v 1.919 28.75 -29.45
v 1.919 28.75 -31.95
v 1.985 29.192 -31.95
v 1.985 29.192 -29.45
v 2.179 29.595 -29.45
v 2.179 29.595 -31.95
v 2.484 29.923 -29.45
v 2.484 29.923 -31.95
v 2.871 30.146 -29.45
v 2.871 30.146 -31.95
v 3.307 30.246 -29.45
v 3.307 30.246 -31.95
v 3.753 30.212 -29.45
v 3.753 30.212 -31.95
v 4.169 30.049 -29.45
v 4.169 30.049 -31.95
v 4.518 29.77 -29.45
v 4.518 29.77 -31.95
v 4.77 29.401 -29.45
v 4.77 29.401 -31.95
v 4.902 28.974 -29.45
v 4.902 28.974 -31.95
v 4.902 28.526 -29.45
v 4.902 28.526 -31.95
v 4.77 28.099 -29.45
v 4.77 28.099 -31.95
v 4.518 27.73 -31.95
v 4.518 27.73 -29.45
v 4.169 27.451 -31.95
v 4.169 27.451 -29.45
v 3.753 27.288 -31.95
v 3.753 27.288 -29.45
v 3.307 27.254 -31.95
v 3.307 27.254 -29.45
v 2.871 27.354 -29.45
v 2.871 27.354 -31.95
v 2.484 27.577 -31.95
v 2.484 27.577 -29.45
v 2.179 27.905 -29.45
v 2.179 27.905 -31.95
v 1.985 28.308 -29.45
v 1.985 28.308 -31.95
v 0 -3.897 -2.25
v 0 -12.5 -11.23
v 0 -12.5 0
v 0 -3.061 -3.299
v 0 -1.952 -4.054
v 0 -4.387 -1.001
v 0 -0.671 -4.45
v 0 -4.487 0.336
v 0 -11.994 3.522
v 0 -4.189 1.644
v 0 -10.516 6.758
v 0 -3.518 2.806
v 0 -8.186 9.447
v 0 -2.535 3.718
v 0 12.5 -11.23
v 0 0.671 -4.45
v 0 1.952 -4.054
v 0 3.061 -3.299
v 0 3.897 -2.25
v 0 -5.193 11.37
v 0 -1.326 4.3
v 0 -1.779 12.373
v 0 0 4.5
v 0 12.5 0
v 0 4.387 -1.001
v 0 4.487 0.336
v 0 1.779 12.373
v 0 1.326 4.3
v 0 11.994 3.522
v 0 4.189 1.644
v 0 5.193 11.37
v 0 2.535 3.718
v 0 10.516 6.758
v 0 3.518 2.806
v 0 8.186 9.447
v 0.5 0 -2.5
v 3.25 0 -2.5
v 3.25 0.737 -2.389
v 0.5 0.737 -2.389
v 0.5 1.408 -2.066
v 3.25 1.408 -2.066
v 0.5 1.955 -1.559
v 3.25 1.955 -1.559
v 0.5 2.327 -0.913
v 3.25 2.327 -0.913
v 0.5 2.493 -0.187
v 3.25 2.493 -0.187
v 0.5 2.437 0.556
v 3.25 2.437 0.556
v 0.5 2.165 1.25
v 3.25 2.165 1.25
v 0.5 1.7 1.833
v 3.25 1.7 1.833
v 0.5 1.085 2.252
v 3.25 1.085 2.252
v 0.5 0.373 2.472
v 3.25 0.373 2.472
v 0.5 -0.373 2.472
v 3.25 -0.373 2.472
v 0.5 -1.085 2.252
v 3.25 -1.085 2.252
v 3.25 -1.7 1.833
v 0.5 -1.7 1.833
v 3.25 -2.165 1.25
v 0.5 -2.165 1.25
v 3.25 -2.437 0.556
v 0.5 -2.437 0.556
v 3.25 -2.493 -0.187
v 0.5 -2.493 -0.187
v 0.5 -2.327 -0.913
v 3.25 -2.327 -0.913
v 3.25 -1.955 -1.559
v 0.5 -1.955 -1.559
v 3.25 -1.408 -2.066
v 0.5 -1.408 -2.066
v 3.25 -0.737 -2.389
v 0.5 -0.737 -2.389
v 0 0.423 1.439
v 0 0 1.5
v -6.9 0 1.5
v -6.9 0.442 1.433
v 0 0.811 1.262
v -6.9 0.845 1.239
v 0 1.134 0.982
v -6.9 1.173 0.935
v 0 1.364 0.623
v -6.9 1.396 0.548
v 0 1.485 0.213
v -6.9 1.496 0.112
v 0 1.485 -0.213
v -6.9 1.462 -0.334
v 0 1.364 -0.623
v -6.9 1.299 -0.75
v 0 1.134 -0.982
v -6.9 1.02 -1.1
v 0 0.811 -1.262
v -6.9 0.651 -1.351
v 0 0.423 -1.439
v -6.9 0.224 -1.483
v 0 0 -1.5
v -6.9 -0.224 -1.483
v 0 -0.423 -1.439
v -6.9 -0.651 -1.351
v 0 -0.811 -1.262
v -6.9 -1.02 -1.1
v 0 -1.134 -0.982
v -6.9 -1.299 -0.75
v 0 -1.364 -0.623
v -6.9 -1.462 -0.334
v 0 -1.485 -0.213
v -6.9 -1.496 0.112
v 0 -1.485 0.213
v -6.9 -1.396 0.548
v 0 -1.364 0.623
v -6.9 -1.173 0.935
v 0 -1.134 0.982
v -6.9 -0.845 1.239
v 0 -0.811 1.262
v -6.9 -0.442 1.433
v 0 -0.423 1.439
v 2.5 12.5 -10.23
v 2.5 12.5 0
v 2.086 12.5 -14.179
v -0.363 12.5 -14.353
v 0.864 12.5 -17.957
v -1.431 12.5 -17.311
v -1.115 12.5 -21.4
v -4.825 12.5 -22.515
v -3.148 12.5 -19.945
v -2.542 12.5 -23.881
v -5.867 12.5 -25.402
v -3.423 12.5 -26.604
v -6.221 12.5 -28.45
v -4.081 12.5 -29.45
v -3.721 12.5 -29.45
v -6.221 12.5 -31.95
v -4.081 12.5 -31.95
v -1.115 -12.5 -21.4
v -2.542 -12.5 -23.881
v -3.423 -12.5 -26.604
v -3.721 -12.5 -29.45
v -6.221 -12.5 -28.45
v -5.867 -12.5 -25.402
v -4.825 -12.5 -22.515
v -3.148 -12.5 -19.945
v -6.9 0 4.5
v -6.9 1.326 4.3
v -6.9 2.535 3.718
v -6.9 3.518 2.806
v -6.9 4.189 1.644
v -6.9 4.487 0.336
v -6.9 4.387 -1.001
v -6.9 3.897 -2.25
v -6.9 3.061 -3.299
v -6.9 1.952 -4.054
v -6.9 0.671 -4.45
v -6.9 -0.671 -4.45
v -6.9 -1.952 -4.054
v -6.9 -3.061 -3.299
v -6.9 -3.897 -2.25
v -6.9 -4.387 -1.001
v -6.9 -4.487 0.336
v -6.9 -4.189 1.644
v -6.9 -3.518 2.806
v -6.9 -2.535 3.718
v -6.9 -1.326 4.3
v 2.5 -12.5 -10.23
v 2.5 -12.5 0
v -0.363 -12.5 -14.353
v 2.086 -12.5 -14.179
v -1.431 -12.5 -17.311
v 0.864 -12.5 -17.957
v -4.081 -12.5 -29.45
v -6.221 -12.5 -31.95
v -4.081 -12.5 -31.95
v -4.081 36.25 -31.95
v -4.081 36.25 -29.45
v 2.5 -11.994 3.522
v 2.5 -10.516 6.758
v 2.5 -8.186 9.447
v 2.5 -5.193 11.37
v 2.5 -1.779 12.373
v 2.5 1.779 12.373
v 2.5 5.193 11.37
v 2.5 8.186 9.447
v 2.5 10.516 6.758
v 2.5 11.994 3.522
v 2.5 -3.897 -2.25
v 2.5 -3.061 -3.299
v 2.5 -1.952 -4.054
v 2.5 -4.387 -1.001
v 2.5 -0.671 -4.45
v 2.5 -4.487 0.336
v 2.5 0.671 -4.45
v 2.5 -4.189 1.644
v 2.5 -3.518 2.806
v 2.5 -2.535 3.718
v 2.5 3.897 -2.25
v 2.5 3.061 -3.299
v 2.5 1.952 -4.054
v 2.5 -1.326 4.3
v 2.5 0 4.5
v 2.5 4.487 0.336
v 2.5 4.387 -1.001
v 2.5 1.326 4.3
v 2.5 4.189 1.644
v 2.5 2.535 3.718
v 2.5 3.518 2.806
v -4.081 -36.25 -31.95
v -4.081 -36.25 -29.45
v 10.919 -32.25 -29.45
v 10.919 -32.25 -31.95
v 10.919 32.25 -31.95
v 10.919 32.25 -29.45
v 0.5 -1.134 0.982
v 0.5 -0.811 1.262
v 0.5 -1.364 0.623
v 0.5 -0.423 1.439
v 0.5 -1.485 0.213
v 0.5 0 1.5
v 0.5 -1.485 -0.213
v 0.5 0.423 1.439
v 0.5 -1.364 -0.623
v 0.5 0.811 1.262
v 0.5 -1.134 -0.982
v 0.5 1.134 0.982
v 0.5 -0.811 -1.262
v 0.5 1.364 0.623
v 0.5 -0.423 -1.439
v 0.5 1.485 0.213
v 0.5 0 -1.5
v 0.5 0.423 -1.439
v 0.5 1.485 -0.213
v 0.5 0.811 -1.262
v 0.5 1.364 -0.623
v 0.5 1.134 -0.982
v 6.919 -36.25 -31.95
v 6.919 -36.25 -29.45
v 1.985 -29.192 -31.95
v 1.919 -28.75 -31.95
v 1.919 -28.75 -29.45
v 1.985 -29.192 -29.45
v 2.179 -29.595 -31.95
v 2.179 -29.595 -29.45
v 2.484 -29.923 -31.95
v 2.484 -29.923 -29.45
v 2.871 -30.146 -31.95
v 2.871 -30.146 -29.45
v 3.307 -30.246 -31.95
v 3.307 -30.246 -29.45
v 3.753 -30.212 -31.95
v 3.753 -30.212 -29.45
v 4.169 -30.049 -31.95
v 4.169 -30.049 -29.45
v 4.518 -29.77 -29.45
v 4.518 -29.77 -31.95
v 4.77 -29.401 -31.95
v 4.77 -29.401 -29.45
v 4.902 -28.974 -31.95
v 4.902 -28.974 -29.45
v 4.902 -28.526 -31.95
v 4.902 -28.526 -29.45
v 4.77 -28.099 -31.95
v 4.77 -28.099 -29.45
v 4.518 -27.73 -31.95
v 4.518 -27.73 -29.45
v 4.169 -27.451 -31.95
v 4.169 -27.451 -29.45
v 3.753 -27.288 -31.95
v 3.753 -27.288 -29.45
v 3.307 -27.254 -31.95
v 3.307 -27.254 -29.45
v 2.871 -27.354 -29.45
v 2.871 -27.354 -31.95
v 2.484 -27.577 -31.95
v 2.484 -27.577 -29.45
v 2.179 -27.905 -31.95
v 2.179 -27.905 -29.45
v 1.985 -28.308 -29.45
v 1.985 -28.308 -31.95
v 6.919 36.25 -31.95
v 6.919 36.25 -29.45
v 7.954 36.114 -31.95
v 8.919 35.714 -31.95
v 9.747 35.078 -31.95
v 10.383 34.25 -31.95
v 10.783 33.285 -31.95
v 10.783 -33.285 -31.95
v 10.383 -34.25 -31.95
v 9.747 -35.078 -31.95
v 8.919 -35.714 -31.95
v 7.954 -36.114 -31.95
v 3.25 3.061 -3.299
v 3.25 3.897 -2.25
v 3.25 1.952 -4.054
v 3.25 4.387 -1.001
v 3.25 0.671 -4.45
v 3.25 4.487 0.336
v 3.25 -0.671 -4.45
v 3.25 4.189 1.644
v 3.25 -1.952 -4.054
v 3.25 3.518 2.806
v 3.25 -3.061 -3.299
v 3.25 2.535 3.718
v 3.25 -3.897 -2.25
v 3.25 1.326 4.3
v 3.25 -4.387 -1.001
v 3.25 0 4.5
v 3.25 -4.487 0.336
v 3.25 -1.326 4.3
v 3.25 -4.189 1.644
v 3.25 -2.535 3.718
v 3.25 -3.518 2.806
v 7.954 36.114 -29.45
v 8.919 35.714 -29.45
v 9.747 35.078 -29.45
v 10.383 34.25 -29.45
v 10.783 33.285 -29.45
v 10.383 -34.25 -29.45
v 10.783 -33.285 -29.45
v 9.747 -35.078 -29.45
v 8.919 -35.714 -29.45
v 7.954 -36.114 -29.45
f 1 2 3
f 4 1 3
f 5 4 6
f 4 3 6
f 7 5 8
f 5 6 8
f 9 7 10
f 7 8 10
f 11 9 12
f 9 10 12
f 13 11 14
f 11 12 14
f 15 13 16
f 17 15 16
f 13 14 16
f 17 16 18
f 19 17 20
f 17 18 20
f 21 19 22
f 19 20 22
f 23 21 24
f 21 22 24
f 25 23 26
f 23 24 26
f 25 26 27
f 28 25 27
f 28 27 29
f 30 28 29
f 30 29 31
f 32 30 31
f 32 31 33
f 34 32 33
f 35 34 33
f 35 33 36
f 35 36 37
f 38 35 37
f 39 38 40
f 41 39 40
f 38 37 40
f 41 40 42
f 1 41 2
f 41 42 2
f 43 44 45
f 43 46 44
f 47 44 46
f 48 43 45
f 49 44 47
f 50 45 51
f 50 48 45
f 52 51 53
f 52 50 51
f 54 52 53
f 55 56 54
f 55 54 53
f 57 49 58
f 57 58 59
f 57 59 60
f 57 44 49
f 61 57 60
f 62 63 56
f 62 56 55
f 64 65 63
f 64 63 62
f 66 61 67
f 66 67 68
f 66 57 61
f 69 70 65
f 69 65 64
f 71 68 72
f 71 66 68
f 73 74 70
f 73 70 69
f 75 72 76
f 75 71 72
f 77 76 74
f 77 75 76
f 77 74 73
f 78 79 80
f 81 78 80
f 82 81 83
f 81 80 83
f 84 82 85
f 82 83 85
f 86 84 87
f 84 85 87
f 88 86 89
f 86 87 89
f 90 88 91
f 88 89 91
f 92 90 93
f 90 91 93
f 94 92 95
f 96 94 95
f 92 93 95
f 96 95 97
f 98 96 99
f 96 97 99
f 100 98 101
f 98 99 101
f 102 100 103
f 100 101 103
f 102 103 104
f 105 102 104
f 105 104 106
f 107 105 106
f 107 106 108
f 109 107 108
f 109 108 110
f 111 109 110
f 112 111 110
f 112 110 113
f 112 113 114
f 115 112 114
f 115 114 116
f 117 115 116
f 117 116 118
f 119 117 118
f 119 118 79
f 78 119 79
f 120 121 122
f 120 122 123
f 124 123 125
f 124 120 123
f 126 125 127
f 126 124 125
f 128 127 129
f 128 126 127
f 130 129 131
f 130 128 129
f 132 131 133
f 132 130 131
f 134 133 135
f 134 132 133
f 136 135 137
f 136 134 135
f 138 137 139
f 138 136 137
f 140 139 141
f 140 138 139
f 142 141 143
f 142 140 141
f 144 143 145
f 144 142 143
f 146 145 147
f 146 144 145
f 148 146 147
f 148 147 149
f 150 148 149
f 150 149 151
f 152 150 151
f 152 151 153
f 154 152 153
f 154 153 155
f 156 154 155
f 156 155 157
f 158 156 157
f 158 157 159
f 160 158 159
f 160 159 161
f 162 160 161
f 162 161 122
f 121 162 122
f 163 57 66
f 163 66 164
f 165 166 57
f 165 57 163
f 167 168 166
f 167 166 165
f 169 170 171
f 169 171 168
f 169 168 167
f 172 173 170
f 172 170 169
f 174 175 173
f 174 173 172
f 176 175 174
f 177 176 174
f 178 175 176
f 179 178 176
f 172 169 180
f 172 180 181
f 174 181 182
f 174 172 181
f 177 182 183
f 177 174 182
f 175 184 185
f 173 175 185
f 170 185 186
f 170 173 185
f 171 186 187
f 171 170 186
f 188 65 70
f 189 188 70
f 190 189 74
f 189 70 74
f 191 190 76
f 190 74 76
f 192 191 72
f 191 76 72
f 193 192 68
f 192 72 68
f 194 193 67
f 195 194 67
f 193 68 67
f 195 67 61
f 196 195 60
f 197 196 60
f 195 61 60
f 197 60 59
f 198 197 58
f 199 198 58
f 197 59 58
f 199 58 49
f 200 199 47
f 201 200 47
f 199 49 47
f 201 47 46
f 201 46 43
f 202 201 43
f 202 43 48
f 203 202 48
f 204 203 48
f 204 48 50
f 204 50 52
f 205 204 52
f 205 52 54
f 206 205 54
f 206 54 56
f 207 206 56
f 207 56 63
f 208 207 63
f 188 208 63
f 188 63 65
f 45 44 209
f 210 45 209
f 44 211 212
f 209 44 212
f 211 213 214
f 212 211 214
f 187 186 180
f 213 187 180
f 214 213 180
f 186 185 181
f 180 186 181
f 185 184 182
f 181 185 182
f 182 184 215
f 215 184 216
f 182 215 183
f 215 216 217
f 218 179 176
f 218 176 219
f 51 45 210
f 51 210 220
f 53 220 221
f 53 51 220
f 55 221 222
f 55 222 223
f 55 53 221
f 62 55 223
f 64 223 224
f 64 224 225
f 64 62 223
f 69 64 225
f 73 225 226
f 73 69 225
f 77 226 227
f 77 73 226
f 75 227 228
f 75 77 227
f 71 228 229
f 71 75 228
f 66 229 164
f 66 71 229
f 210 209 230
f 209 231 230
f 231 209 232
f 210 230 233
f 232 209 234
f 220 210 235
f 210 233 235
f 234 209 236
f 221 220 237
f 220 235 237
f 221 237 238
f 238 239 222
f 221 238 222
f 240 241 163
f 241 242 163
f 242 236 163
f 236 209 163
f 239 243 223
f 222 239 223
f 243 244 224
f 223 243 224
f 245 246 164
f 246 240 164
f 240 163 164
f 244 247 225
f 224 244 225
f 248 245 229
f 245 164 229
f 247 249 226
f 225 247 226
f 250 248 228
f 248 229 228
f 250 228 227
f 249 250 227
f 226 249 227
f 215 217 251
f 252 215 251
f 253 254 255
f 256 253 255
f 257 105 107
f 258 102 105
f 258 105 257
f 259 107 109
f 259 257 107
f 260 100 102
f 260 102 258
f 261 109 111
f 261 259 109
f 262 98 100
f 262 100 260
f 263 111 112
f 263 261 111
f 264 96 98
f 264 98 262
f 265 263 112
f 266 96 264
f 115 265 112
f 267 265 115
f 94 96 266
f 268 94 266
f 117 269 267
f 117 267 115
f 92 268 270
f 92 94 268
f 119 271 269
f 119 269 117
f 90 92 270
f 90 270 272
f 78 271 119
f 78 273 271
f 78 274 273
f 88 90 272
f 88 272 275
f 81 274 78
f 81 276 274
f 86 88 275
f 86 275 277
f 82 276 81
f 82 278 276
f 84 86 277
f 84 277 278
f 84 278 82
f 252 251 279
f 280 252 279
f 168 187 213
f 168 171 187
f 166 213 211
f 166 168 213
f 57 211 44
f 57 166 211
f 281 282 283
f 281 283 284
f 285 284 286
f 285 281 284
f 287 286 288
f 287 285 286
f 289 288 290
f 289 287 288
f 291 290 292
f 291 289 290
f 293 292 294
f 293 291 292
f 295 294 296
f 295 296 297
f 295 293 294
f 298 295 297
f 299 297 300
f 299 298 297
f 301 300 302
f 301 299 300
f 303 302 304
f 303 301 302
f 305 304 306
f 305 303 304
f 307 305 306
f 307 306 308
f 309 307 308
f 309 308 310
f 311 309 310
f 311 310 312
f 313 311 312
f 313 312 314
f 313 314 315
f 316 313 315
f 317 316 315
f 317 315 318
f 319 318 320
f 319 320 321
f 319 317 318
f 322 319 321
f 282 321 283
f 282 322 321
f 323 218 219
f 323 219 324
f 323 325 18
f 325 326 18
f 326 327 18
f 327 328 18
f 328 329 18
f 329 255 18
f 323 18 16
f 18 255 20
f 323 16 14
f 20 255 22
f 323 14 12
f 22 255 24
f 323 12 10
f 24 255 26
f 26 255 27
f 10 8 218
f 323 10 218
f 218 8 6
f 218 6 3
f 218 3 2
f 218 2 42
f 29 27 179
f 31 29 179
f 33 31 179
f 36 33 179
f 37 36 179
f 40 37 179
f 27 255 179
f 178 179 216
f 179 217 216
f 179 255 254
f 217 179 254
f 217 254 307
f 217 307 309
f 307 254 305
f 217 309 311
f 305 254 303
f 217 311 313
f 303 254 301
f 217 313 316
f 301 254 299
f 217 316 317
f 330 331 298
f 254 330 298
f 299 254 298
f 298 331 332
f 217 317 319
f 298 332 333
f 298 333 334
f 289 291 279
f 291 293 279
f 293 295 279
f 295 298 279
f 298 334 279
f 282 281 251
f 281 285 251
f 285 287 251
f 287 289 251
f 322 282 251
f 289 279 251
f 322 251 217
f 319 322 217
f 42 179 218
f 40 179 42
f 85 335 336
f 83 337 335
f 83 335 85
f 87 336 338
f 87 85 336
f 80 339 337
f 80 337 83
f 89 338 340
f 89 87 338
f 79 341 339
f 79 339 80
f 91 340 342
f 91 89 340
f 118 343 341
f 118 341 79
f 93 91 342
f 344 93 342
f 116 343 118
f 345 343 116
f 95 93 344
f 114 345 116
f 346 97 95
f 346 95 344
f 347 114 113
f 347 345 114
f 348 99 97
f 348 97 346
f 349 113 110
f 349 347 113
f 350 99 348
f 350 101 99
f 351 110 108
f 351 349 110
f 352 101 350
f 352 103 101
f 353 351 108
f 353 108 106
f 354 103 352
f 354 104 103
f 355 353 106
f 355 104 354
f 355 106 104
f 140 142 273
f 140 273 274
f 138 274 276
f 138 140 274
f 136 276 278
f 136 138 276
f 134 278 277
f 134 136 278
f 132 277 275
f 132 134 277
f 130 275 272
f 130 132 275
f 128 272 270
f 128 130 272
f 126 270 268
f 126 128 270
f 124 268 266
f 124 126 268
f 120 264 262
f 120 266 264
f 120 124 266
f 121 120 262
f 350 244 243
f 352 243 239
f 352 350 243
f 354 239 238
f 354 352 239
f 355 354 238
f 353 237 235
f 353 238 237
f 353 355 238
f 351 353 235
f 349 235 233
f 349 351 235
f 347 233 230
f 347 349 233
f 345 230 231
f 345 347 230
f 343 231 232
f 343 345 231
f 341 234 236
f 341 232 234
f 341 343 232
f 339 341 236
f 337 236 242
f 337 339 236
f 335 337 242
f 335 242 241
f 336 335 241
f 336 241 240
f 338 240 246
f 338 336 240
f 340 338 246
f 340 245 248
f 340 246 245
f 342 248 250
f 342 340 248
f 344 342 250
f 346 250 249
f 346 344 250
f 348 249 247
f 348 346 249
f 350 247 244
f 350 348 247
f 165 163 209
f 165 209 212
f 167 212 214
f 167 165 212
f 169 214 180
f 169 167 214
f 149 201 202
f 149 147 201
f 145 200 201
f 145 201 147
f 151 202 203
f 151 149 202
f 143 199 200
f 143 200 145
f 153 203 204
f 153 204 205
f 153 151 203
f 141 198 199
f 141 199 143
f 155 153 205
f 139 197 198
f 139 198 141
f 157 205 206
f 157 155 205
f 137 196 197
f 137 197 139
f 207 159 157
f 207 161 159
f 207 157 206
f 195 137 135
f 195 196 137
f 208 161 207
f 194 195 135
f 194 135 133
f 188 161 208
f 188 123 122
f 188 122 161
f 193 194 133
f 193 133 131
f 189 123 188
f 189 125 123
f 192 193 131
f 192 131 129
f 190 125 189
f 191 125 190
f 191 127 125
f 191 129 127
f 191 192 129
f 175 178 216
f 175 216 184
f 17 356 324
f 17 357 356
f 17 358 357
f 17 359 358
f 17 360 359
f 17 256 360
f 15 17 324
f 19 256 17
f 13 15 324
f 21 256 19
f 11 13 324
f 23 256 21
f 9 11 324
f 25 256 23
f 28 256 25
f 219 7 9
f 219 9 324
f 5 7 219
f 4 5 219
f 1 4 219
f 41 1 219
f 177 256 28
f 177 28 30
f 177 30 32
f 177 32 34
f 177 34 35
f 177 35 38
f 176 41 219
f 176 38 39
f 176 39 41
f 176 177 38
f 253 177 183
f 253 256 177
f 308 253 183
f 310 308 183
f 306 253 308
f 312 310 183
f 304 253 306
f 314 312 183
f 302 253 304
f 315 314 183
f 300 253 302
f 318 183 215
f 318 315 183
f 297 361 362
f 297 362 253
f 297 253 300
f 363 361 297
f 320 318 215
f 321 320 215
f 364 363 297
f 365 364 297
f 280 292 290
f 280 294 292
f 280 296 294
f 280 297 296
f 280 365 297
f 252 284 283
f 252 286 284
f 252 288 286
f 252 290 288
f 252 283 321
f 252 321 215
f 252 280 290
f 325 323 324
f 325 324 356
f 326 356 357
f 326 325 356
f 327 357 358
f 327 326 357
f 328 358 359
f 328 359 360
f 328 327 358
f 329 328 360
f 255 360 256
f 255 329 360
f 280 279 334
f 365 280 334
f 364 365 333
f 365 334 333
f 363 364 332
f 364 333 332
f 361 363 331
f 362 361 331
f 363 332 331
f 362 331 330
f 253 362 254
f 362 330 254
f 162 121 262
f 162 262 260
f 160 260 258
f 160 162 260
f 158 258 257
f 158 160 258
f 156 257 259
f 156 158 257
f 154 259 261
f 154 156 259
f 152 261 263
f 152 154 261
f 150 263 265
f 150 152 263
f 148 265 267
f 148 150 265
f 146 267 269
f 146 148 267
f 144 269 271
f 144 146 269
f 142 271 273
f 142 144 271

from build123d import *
from build123d.topology import SkipClean

# Parameters (mm, degrees)
SKETCH1_R                = 1.5
BOSS_EXTRUDE1_DEPTH      = 2.5
BOSS_EXTRUDE2_DEPTH      = 6.9
BOSS_EXTRUDE2_DEPTH_BACK = 2.5
SKETCH2_R                = 4.5
SKETCH2_R_2              = 1.5
SKETCH4_R                = 2.5
CUT_EXTRUDE1_DEPTH       = 2
BOSS_EXTRUDE3_START      = 0.75
SKETCH5_R                = 4.5
SKETCH5_R_2              = 2.5
BOSS_EXTRUDE3_DEPTH      = 0.75
BOSS_EXTRUDE4_DEPTH      = 2.5
CUT_EXTRUDE2_REACH       = 80.314
SKETCH7_W                = 7
SKETCH7_H                = 16.5
SKETCH7_W_2              = 16
SKETCH7_H_2              = 8
CUT_EXTRUDE3_REACH       = 82.041
SKETCH9_W                = 2.5
SKETCH9_H                = 22.388822383
BOSS_EXTRUDE5_DEPTH      = 12.5
FILLET2_R                = 1
FILLET3_R                = 4
CUT_EXTRUDE4_DEPTH       = 74.103052287
CUT_EXTRUDE4_DEPTH_BACK  = 74.103052287
SKETCH10_W               = 78.235731334
SKETCH10_H               = 6.290045588
SKETCH11_W               = 14.64
SKETCH11_H               = 2.5
BOSS_EXTRUDE6_DEPTH      = 12.5
BOSS_EXTRUDE7_DEPTH      = 2.5
SKETCH14_R               = 1.5
CUT_EXTRUDE5_DEPTH       = 2.5


with BuildPart() as part:
    # Sketch1 → Boss-Extrude1 (new body)
    with BuildSketch(Plane(origin=(0, 0, 0), x_dir=(0, 0, -1), z_dir=(1, 0, 0))):
        with BuildLine():
            Line((0, 12.5), (34.45, 12.5))
            Line((34.45, 12.5), (34.45, -12.5))
            Line((34.45, -12.5), (0, -12.5))
            ThreePointArc((0, -12.5), (-12.5, 0), (0, 12.5))
        make_face()
        Circle(SKETCH1_R, mode=Mode.SUBTRACT)
    extrude(amount=BOSS_EXTRUDE1_DEPTH)

    # Sketch2 → Boss-Extrude2 (add, two sides: drawn at the far end of the back side and taken through both)
    with BuildSketch(Plane.ZY.offset(-BOSS_EXTRUDE2_DEPTH_BACK)):
        Circle(SKETCH2_R)
        Circle(SKETCH2_R_2, mode=Mode.SUBTRACT)
    extrude(amount=BOSS_EXTRUDE2_DEPTH + BOSS_EXTRUDE2_DEPTH_BACK)

    # Sketch4 → Cut-Extrude1 (cut)
    with BuildSketch(Plane(origin=(2.5, 0, 0), x_dir=(0, 0, -1), z_dir=(1, 0, 0))):
        Circle(SKETCH4_R)
    extrude(amount=-CUT_EXTRUDE1_DEPTH, mode=Mode.SUBTRACT)

    # Sketch5 → Boss-Extrude3 (add)
    with SkipClean():  # the faces are left unmerged after this step: merging them gives an invalid solid
        with BuildSketch(Plane(origin=(2.5, 0, 0), x_dir=(0, 0, -1), z_dir=(1, 0, 0)).offset(BOSS_EXTRUDE3_START)):
            with Locations(Location((0, 0, 0), (0, 0, 180))):
                Circle(SKETCH5_R)
            Circle(SKETCH5_R_2, mode=Mode.SUBTRACT)
        extrude(amount=-BOSS_EXTRUDE3_DEPTH)

    # Sketch6 → Boss-Extrude4 (add)
    with SkipClean():  # the faces are left unmerged after this step: merging them gives an invalid solid
        with BuildSketch(Plane(origin=(0, 0, -34.45), x_dir=(-1, 0, 0), z_dir=(0, 0, -1))):
            Polygon((-8.812505246, 36.25), (53.321583376, 36.25), (53.321583376, -36.25), (6.25, -36.25), (-19.178416624, -36.25), (-19.178416624, 36.25), align=None)
        extrude(amount=-BOSS_EXTRUDE4_DEPTH)
    add(part.part.scale(1), mode=Mode.REPLACE)  # the faces are merged on a copy

    # Sketch7 → Cut-Extrude2 (cut, up to next)
    with BuildSketch(Plane.XY.offset(-31.95), mode=Mode.PRIVATE) as cut_extrude2_sk1:
        with Locations((-1.711858899, -11.632438111)):
            Rectangle(SKETCH7_W, SKETCH7_H)
    cut_extrude2_tool1 = extrude(cut_extrude2_sk1.sketch, amount=-CUT_EXTRUDE2_REACH, mode=Mode.PRIVATE) & part.part
    # Sketch7 → Cut-Extrude2 (cut, up to next)
    with BuildSketch(Plane.XY.offset(-31.95), mode=Mode.PRIVATE) as cut_extrude2_sk2:
        with Locations((-16.5, 0)):
            Rectangle(SKETCH7_W_2, SKETCH7_H_2)
    cut_extrude2_tool2 = extrude(cut_extrude2_sk2.sketch, amount=-CUT_EXTRUDE2_REACH, mode=Mode.PRIVATE) & part.part
    add(cut_extrude2_tool1.solids().sort_by_distance((-1.711859, -11.632438, -31.95))[0], mode=Mode.SUBTRACT)
    add(cut_extrude2_tool2.solids().sort_by_distance((-16.5, 0, -31.95))[0], mode=Mode.SUBTRACT)

    # Sketch9 → Cut-Extrude3 (cut, up to next)
    with BuildSketch(Plane.XZ.offset(12.5), mode=Mode.PRIVATE) as cut_extrude3_sk1:
        with Locations((1.25, -20.755588809)):
            Rectangle(SKETCH9_W, SKETCH9_H)
    cut_extrude3_tool1 = extrude(cut_extrude3_sk1.sketch, amount=-CUT_EXTRUDE3_REACH, mode=Mode.PRIVATE) & part.part
    add(cut_extrude3_tool1.solids().sort_by_distance((1.25, -12.5, -20.755589))[0], mode=Mode.SUBTRACT)


with BuildPart() as cut_extrude3_piece_1:
    # of the separate pieces the step leaves, piece 1, a body of its own (cut_extrude3_pieces)
    add(part.part.solids().sort_by_distance((-53.321583376, 36.25, -31.95))[0])



with BuildPart() as cut_extrude3_piece_2:
    # of the separate pieces the step leaves, piece 2, a body of its own (cut_extrude3_pieces)
    add(part.part.solids().sort_by_distance((0, 12.5, 0))[0])


with BuildPart() as cut_extrude3_piece_1_1:
    add(cut_extrude3_piece_1.part)

    add(cut_extrude3_piece_2.part)  # Boss-Extrude5 merges Cut-Extrude3 piece 2
    # Sketch8 → Boss-Extrude5 (add, symmetric)
    with BuildSketch(Plane(origin=(0, 0, 0), x_dir=(1, 0, 0), z_dir=(0, 1, 0))):
        with BuildLine():
            Line((0, 7.729605828), (2.5, 7.729605828))
            Line((2.5, 7.729605828), (2.5, 10.229605828))
            ThreePointArc((2.5, 10.229605828), (1.573627862, 16.099871922), (-1.115452176, 21.399592472))
            ThreePointArc((-1.115452176, 21.399592472), (-3.053519862, 25.219195088), (-3.721172696, 29.45))
            Line((-3.721172696, 29.45), (-3.721172696, 31.95))
            Line((-3.721172696, 31.95), (-6.221172696, 31.95))
            Line((-6.221172696, 31.95), (-6.221172696, 28.45))
            ThreePointArc((-6.221172696, 28.45), (-5.429444077, 23.92831405), (-3.148463103, 19.944646916))
            ThreePointArc((-3.148463103, 19.944646916), (-0.81124762, 15.862767844), (0, 11.229605828))
            Line((0, 11.229605828), (0, 7.729605828))
        make_face()
    extrude(amount=BOSS_EXTRUDE5_DEPTH, both=True)

    # Fillet2
    fillet2_edges = [cut_extrude3_piece_1_1.edges().sort_by_distance(p)[0] for p in [
        (-8.5, 4, -33.2),
        (-8.5, -4, -33.2),
        (-24.5, -4, -33.2),
        (-24.5, 4, -33.2),
        (-5.211858899, -19.882438111, -33.2),
        (-5.211858899, -3.382438111, -33.2),
        (1.788141101, -3.382438111, -33.2),
        (1.788141101, -19.882438111, -33.2),
    ]]
    fillet(fillet2_edges, radius=FILLET2_R)

    # Fillet3
    fillet3_edges = [cut_extrude3_piece_1_1.edges().sort_by_distance(p)[0] for p in [
        (19.178416624, 36.25, -33.2),
        (-53.321583376, 36.25, -33.2),
        (-53.321583376, -36.25, -33.2),
        (19.178416624, -36.25, -33.2),
    ]]
    fillet(fillet3_edges, radius=FILLET3_R)

    # Sketch10 → Cut-Extrude4 (cut, two sides: drawn at the far end of the back side and taken through both)
    with SkipClean():  # the faces are left unmerged after this step: merging them gives an invalid solid
        with BuildSketch(Plane(origin=(0, 0, 0), x_dir=(1, 0, 0), z_dir=(0, 1, 0)).offset(-CUT_EXTRUDE4_DEPTH_BACK)):
            with Locations((-17.391929865, 35.095022794)):
                Rectangle(SKETCH10_W, SKETCH10_H)
        extrude(amount=CUT_EXTRUDE4_DEPTH + CUT_EXTRUDE4_DEPTH_BACK, mode=Mode.SUBTRACT)

    # Sketch11 → Boss-Extrude6 (add, symmetric)
    with BuildSketch(Plane(origin=(0, 0, 0), x_dir=(1, 0, 0), z_dir=(0, 1, 0))):
        with Locations((3.598827304, 30.7)):
            Rectangle(SKETCH11_W, SKETCH11_H)
    boss_extrude6 = extrude(amount=BOSS_EXTRUDE6_DEPTH, both=True)

    # Sketch13 → Boss-Extrude7 (add)
    with BuildSketch(Plane(origin=(0, 0, -31.95), x_dir=(-1, 0, 0), z_dir=(0, 0, -1))):
        with BuildLine():
            Line((-10.918827304, 12.5), (4.081172696, 12.5))
            Line((4.081172696, 12.5), (4.081172696, 28.75))
            Line((4.081172696, 28.75), (4.081172696, 36.25))
            Line((4.081172696, 36.25), (-3.678827304, 36.25))
            Line((-3.678827304, 36.25), (-6.918827304, 36.25))
            ThreePointArc((-6.918827304, 36.25), (-9.747254429, 35.078427125), (-10.918827304, 32.25))
            Line((-10.918827304, 32.25), (-10.918827304, 28.75))
            Line((-10.918827304, 28.75), (-10.918827304, 12.5))
        make_face()
    boss_extrude7 = extrude(amount=-BOSS_EXTRUDE7_DEPTH)

    # Mirror1: Boss-Extrude6, Boss-Extrude7 across plane
    add(boss_extrude6.mirror(Plane.ZX))
    add(boss_extrude7.mirror(Plane.ZX))

    # Sketch14 → Cut-Extrude5 (cut)
    with BuildSketch(Plane(origin=(0, 0, -31.95), x_dir=(-1, 0, 0), z_dir=(0, 0, -1))):
        with Locations((-3.418827304, 28.75)):
            Circle(SKETCH14_R)
    cut_extrude5 = extrude(amount=-CUT_EXTRUDE5_DEPTH, mode=Mode.SUBTRACT)

    # Mirror2: Cut-Extrude5 across plane
    add(cut_extrude5.mirror(Plane.ZX), mode=Mode.SUBTRACT)


solid = cut_extrude3_piece_1_1.part
